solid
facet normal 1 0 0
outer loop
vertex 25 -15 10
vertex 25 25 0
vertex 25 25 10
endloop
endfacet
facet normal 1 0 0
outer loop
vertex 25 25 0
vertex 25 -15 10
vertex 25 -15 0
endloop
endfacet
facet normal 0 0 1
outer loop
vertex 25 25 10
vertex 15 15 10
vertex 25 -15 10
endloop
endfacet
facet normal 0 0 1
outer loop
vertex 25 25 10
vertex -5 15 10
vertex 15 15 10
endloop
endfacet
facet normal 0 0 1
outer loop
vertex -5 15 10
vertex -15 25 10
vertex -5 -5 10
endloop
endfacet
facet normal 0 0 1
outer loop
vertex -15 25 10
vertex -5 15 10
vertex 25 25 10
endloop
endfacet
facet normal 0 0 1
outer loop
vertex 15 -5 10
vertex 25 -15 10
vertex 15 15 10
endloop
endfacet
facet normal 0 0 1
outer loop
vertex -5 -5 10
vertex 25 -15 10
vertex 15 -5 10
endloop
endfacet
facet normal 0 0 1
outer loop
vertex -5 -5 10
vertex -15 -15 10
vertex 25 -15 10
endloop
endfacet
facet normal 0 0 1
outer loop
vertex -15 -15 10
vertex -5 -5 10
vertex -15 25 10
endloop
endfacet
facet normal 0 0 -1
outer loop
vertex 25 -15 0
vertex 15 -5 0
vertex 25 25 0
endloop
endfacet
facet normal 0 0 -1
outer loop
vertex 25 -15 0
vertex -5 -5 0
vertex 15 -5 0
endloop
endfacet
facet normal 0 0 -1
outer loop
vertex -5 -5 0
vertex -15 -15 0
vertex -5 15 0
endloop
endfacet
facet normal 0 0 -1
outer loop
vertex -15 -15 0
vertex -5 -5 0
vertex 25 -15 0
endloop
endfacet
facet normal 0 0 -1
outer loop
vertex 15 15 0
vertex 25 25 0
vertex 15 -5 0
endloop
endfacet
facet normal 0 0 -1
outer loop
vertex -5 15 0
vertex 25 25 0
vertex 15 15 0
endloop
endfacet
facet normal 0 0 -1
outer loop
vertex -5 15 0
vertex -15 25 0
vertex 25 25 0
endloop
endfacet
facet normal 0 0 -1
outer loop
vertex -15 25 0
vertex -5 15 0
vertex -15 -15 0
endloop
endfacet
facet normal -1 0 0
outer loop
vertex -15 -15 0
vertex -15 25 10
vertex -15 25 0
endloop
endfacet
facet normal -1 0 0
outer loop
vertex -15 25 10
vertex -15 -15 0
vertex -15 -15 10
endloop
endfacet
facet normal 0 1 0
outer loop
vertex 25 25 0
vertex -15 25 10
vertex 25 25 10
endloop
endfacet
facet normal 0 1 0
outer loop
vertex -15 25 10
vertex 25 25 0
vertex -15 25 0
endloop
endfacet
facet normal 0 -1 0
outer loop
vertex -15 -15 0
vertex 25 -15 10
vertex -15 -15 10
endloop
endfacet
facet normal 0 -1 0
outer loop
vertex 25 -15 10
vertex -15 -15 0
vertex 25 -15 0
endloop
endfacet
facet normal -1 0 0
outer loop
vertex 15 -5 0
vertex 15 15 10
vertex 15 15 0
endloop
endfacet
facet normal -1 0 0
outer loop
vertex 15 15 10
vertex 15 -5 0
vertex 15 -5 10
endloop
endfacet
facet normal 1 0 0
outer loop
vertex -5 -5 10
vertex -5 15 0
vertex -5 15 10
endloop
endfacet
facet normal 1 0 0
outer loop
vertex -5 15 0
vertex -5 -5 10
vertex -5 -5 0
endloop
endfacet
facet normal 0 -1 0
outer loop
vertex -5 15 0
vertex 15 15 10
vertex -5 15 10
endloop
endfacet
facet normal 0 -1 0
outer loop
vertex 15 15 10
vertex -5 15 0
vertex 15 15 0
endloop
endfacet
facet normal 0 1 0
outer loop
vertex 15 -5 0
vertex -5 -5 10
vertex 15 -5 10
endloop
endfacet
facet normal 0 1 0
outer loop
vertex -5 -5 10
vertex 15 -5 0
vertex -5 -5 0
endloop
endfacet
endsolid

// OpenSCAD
difference() {
	translate([-15, -15, 0])
		cube([40, 40, 10]);
	translate([-5, -5, 0])
		cube([20, 20, 10]);
}
